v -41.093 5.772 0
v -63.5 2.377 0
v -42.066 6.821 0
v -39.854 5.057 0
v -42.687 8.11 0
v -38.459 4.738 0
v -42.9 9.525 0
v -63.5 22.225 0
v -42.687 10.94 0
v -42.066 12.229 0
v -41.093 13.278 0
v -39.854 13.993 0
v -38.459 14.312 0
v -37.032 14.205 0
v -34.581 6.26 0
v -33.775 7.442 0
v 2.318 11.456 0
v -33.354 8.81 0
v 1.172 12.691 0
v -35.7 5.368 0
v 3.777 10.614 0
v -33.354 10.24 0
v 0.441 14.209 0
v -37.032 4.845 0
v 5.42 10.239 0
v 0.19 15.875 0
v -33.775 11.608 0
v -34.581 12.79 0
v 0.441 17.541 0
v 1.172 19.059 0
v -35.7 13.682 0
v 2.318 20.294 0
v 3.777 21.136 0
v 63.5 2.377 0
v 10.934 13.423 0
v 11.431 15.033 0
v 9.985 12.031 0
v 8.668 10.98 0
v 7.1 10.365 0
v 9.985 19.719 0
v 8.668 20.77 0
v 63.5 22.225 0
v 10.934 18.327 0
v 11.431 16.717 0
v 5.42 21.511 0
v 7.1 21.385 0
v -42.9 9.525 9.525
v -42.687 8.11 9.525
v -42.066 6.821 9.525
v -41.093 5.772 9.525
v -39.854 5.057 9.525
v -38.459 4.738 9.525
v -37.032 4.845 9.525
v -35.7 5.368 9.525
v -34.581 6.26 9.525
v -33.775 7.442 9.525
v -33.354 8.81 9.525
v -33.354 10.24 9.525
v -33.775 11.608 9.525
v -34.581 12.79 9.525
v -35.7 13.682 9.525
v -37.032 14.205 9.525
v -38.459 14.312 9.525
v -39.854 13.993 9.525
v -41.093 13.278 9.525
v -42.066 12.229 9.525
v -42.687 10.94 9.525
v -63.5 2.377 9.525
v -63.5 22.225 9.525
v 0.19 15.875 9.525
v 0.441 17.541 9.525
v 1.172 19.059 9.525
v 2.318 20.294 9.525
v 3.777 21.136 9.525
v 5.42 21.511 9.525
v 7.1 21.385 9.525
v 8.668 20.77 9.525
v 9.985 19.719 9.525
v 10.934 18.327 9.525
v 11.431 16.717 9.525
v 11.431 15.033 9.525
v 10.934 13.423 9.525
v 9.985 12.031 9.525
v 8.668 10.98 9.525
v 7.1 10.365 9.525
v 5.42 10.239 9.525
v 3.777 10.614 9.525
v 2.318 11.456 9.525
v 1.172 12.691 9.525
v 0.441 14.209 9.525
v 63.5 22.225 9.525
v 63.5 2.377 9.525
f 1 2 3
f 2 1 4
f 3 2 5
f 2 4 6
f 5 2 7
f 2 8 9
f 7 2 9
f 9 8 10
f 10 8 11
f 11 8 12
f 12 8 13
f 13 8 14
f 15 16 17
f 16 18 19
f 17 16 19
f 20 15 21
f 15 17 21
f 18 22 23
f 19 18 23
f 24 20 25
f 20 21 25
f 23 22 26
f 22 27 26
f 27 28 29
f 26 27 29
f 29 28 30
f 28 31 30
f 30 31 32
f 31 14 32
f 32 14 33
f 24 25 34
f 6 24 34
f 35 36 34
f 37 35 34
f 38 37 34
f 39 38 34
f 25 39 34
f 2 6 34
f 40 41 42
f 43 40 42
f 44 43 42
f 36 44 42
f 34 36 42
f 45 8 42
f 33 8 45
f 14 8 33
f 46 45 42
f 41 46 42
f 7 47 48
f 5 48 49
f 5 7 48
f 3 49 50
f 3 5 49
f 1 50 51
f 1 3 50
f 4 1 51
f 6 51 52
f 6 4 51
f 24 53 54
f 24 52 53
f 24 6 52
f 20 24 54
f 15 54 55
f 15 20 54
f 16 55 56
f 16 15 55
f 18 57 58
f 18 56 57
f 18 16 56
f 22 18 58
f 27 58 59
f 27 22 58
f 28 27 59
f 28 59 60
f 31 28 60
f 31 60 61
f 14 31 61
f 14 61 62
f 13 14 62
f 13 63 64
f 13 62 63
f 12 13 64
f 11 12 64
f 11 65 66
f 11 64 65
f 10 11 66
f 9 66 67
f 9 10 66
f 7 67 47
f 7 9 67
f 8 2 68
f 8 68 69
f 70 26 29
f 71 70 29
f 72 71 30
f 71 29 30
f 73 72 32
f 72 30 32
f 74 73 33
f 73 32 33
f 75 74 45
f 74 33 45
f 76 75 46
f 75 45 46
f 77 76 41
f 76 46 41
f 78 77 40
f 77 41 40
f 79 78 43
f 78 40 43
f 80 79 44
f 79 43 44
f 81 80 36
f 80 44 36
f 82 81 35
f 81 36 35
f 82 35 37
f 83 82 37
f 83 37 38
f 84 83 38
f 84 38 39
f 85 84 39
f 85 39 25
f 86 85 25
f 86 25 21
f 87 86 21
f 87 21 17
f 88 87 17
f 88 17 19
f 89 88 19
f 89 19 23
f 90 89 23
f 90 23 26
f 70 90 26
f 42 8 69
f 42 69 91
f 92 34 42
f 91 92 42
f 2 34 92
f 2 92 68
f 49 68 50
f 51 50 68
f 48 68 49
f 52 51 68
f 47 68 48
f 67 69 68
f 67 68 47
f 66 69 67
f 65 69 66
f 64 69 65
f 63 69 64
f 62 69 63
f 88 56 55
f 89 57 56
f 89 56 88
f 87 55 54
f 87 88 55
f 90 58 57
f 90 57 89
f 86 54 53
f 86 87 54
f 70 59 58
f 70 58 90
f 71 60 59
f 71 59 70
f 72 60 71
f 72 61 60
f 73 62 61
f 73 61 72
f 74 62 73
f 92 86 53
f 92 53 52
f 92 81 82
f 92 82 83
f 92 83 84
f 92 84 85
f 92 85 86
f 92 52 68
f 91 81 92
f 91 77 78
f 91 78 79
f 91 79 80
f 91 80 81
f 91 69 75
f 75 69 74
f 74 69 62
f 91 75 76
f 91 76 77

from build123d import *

# Parameters (mm, degrees)
SKETCH1_W           = 127
SKETCH1_H           = 44.45
BOSS_EXTRUDE1_DEPTH = 9.525
SKETCH6_R           = 4.8
CUT_EXTRUDE1_DEPTH  = 68.947967225
SKETCH10_R          = 2.286
CUT_EXTRUDE2_DEPTH  = 3.81
SKETCH13_W          = 127
SKETCH13_H          = 49.203053771
CUT_EXTRUDE3_DEPTH  = 68.947967225
SKETCH15_R          = 5.652121823
CUT_EXTRUDE4_DEPTH  = 68.947967225


with BuildPart() as part:
    # Sketch1 → Boss-Extrude1 (new body)
    with BuildSketch(Plane.XY):
        Rectangle(SKETCH1_W, SKETCH1_H)
    extrude(amount=BOSS_EXTRUDE1_DEPTH)

    # Sketch6 → Cut-Extrude1 (cut, through all)
    with BuildSketch(Plane.XY):
        with Locations(Location((-38.1, 9.525, 0), (0, 0, 180))):
            Circle(SKETCH6_R)
    extrude(amount=CUT_EXTRUDE1_DEPTH, mode=Mode.SUBTRACT)

    # Sketch10 → Cut-Extrude2 (cut)
    with BuildSketch(Plane.XY.offset(9.525)):
        with Locations((-46.11545283, -16.764)):
            Circle(SKETCH10_R)
    extrude(amount=-CUT_EXTRUDE2_DEPTH, mode=Mode.SUBTRACT)

    # Sketch13 → Cut-Extrude3 (cut, through all)
    with BuildSketch(Plane(origin=(0, 0, 0), x_dir=(-1, 0, 0), z_dir=(0, 0, -1))):
        with Locations((0, -22.225000001)):
            Rectangle(SKETCH13_W, SKETCH13_H)
    extrude(amount=-CUT_EXTRUDE3_DEPTH, mode=Mode.SUBTRACT)

    # Sketch15 → Cut-Extrude4 (cut, through all)
    with BuildSketch(Plane(origin=(0, 0, 0), x_dir=(-1, 0, 0), z_dir=(0, 0, -1))):
        with Locations((-5.842, 15.875)):
            Circle(SKETCH15_R)
    extrude(amount=-CUT_EXTRUDE4_DEPTH, mode=Mode.SUBTRACT)


solid = part.part
